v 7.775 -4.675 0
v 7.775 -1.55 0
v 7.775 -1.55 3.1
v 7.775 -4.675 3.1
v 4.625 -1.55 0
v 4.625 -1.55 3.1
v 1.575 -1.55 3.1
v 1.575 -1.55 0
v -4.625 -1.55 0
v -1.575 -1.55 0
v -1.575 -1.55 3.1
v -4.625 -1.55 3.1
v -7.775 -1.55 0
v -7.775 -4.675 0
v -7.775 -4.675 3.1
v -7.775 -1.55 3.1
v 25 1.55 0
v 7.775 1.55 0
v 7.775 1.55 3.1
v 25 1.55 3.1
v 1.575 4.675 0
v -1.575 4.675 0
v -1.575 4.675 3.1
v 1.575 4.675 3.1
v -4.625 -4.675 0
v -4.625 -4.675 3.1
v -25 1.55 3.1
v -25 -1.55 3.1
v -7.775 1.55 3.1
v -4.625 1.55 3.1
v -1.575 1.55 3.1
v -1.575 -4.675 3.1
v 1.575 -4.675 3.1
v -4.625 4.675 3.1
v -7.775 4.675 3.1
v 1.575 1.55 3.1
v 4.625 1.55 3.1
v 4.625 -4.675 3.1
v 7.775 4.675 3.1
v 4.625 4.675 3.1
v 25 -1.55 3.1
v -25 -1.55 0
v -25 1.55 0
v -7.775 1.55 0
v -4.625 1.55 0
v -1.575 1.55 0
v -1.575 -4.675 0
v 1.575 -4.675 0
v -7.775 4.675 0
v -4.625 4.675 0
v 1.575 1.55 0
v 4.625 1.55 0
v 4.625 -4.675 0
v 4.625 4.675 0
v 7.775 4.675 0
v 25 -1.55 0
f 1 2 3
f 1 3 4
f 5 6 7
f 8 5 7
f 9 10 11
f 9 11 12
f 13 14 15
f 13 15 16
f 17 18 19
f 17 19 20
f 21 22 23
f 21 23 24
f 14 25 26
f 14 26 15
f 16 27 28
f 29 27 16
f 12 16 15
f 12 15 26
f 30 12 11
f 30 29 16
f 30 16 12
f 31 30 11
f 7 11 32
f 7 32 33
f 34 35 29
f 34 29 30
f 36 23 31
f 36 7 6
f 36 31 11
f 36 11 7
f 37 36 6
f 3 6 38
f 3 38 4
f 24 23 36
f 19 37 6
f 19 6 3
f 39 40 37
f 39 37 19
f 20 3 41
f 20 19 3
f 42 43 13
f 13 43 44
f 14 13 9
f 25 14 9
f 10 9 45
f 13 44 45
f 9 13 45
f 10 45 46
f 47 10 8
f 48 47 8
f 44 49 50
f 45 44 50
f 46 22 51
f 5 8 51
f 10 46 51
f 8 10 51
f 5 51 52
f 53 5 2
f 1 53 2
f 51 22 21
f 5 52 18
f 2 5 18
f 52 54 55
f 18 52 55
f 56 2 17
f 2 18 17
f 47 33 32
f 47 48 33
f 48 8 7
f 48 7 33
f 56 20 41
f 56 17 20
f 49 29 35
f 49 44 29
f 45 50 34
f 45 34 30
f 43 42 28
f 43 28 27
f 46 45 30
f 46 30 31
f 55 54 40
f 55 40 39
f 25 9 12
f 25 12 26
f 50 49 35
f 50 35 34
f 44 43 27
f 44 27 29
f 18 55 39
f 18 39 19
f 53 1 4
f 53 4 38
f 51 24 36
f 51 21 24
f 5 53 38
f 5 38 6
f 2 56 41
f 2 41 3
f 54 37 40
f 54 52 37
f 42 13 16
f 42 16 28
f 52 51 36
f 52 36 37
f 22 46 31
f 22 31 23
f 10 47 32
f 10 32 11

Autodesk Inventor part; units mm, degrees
ref_plane "YZ Plane" through (0, 0, 0) normal (1, 0, 0) x (0, 1, 0)
ref_plane "XZ Plane" through (0, 0, 0) normal (0, 1, 0) x (-1, 0, 0)
ref_plane "XY Plane" through (0, 0, 0) normal (0, 0, 1) x (1, 0, 0)
sketch "tabs" plane through (0, 0, 0) normal (0, 0, 1) x (1, 0, 0)
  line L0 (15.6175, 13.9118) -> (18.7675, 13.9118)
  line L1 (18.7675, 13.9118) -> (18.7675, 10.7868)
  line L2 (18.7675, 10.7868) -> (15.6175, 10.7868)
  line L3 (15.6175, 10.7868) -> (15.6175, 13.9118)
  line L4 (21.8175, 13.9118) -> (24.9675, 13.9118)
  line L5 (24.9675, 13.9118) -> (24.9675, 10.7868)
  line L6 (24.9675, 10.7868) -> (21.8175, 10.7868)
  line L7 (21.8175, 10.7868) -> (21.8175, 13.9118)
  line L8 (28.0175, 13.9118) -> (31.1675, 13.9118)
  line L9 (31.1675, 13.9118) -> (31.1675, 10.7868)
  line L10 (31.1675, 10.7868) -> (28.0175, 10.7868)
  line L11 (28.0175, 10.7868) -> (28.0175, 13.9118)
  line L12 (23.3925, 10.7868) -> (23.3925, 8.8536) construction
  point P0 (23.3925, 12.1901)
  dimension "d2" = 3.15
  dimension "d3" = 3.05
  dimension "d4" = 3.05
  dimension "d5" = 3.125
sketch "Sketch1" plane through (0, 0, 0) normal (0, 0, 1) x (1, 0, 0)
  line L0 (-25, 1.55) -> (25, 1.55)
  line L1 (25, 1.55) -> (25, -1.55)
  line L2 (25, -1.55) -> (-25, -1.55)
  line L3 (-25, -1.55) -> (-25, 1.55)
  line L4 (0, 16.9043) -> (0, -20.0235) construction
  line L5 (-32.3473, 0) -> (40.4078, 0) construction
  line L6 (-7.775, 4.675) -> (-4.625, 4.675)
  line L7 (-4.625, 4.675) -> (-4.625, 1.55)
  line L8 (-4.625, 1.55) -> (-7.775, 1.55)
  line L9 (-7.775, 1.55) -> (-7.775, 4.675)
  line L10 (-1.575, 4.675) -> (1.575, 4.675)
  line L11 (1.575, 4.675) -> (1.575, 1.55)
  line L12 (1.575, 1.55) -> (-1.575, 1.55)
  line L13 (-1.575, 1.55) -> (-1.575, 4.675)
  line L14 (4.625, 4.675) -> (7.775, 4.675)
  line L15 (7.775, 4.675) -> (7.775, 1.55)
  line L16 (7.775, 1.55) -> (4.625, 1.55)
  line L17 (4.625, 1.55) -> (4.625, 4.675)
  line L18 (0, 1.55) -> (0, -0.3832) construction
  line L19 (-7.775, -1.55) -> (-4.625, -1.55)
  line L20 (-4.625, -1.55) -> (-4.625, -4.675)
  line L21 (-4.625, -4.675) -> (-7.775, -4.675)
  line L22 (-7.775, -4.675) -> (-7.775, -1.55)
  line L23 (-1.575, -1.55) -> (1.575, -1.55)
  line L24 (1.575, -1.55) -> (1.575, -4.675)
  line L25 (1.575, -4.675) -> (-1.575, -4.675)
  line L26 (-1.575, -4.675) -> (-1.575, -1.55)
  line L27 (4.625, -1.55) -> (7.775, -1.55)
  line L28 (7.775, -1.55) -> (7.775, -4.675)
  line L29 (7.775, -4.675) -> (4.625, -4.675)
  line L30 (4.625, -4.675) -> (4.625, -1.55)
  line L31 (0, -4.675) -> (0, -6.6082) construction
  point P0 (0, 0)
  point P1 (25, 0)
  dimension "d0" = 50
  dimension "d1" = 3.1
extrude "Extrusion1" add sketch "Sketch1" along normal blind 3.1
equation "\"d2\" = mat + kerf"
equation "\"d3\" = mat - kerf"
equation "\"d4\" = mat - kerf"
equation "\"d5\" = mat + 0.5 * kerf"
equation "\"d1\" = mat"
equation "\"d6\" = mat"
equation "\"mat\" = 3.1"
equation "\"kerf\" = 0.05"
properties part number "link1"
